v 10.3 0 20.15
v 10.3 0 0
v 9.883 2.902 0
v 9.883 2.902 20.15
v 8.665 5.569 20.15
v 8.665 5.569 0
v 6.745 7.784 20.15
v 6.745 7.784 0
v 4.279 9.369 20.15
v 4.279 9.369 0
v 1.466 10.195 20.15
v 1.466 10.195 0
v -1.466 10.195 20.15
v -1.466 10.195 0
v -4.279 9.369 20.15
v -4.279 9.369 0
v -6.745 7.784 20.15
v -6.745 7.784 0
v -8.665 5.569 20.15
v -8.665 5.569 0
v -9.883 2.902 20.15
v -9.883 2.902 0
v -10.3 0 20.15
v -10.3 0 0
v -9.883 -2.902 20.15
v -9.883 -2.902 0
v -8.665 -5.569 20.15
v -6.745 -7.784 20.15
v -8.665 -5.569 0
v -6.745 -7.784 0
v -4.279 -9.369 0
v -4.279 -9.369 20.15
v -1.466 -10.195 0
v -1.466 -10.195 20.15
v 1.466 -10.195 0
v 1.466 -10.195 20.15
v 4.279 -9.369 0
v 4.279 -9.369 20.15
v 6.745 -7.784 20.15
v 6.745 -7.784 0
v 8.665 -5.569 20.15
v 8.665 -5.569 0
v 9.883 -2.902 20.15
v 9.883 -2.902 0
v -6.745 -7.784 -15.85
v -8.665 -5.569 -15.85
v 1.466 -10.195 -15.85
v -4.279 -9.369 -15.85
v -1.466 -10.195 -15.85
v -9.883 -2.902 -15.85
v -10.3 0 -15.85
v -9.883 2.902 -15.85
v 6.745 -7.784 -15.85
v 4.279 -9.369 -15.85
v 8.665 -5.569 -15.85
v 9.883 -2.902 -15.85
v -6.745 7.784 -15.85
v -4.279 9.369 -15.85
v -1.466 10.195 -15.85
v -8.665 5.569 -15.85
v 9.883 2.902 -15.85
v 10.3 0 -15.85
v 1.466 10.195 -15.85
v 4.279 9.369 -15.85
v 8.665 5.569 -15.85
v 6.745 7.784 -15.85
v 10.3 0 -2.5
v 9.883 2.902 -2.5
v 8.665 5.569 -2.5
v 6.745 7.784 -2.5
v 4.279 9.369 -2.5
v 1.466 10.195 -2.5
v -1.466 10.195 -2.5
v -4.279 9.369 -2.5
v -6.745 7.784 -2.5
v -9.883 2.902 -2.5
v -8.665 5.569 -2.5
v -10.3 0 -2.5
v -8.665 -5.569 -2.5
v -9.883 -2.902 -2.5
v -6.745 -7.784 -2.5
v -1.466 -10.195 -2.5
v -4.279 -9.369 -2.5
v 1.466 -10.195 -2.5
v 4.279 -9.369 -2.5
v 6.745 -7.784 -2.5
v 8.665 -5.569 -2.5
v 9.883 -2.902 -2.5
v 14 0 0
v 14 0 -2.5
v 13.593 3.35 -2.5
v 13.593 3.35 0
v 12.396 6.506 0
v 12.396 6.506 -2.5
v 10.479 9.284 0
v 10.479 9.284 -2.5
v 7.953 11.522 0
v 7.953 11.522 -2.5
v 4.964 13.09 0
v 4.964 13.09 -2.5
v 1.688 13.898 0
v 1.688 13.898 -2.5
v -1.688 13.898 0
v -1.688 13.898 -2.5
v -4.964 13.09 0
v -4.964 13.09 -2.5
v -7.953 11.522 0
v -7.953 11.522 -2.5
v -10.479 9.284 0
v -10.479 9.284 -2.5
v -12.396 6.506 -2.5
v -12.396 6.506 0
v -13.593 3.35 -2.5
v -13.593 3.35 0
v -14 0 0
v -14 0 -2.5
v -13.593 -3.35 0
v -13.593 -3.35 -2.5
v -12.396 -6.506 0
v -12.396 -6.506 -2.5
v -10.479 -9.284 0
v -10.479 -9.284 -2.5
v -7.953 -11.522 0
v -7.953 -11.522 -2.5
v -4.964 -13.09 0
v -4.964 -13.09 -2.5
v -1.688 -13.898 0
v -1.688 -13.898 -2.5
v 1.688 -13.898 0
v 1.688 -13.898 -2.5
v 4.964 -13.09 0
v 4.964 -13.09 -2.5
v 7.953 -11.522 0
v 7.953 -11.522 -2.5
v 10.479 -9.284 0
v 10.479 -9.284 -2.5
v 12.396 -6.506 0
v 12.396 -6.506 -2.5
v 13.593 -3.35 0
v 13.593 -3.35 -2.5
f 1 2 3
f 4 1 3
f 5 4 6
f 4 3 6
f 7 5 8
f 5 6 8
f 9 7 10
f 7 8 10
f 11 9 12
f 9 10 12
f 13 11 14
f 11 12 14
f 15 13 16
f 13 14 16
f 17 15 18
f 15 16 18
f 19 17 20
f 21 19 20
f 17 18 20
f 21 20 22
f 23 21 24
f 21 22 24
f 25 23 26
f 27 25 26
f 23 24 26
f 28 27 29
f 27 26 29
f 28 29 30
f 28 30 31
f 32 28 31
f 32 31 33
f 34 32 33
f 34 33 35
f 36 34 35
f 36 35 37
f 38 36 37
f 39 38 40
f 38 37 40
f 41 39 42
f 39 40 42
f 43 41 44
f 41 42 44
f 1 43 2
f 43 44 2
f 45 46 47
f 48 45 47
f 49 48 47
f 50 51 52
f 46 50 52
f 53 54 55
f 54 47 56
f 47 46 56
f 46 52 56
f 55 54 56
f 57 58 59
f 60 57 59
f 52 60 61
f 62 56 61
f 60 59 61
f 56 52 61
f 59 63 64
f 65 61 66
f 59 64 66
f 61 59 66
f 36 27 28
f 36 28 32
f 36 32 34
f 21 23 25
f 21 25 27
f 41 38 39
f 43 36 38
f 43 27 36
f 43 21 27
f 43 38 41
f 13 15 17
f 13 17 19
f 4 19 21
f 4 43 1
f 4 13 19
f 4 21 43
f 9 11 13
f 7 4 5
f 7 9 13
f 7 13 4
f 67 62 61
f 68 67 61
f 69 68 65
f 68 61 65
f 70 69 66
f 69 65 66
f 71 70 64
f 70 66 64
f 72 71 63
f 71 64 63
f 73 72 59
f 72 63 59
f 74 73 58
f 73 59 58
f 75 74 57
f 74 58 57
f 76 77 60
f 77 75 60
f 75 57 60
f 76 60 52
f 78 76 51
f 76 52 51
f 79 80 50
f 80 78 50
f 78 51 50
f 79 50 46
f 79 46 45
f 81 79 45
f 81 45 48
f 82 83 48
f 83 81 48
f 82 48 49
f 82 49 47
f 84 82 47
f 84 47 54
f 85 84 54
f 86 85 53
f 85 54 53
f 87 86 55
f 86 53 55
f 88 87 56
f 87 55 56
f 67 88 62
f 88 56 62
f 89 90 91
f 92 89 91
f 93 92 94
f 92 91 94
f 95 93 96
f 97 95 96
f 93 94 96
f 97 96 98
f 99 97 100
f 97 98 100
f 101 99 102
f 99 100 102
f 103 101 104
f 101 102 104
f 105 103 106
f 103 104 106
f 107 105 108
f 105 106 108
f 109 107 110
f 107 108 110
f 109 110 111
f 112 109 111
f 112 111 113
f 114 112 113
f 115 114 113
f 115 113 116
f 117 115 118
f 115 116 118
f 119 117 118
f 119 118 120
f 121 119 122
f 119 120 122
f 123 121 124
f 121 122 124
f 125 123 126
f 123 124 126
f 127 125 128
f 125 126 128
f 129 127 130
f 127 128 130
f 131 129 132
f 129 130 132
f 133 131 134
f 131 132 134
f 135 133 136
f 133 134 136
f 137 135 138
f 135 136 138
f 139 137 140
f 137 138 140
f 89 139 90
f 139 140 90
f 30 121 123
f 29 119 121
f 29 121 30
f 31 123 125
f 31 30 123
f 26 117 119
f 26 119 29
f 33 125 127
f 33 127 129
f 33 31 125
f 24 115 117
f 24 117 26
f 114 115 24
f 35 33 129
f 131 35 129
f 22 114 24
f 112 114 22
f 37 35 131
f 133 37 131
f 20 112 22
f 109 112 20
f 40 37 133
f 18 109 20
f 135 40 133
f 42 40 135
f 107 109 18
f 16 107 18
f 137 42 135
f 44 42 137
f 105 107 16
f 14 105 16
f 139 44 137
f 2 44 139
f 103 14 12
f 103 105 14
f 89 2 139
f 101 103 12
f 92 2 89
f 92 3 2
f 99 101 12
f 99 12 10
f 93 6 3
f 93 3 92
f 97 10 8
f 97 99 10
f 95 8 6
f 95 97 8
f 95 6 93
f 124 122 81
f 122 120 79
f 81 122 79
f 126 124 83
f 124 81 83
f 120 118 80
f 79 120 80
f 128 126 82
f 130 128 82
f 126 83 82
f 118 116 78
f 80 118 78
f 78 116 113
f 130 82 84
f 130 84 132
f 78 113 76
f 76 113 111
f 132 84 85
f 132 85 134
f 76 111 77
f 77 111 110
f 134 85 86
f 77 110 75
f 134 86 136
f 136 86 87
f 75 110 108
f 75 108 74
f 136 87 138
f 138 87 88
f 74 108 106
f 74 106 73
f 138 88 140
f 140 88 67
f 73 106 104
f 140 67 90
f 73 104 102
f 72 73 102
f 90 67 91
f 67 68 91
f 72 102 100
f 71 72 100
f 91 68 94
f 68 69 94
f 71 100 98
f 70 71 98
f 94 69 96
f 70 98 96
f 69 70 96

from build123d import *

# Parameters (mm, degrees)
SKETCH1_R           = 10.3
BOSS_EXTRUDE1_DEPTH = 20.15
SKETCH1_3_R         = 14
BOSS_EXTRUDE2_DEPTH = 2.5
BOSS_EXTRUDE3_START = -15.85
SKETCH1_4_R         = 10.3
BOSS_EXTRUDE3_DEPTH = 15.85


with BuildPart() as part:
    # Sketch1 → Boss-Extrude1 (new body)
    with BuildSketch(Plane.XY):
        Circle(SKETCH1_R)
    extrude(amount=BOSS_EXTRUDE1_DEPTH)

    # Sketch1<3> → Boss-Extrude2 (add)
    with BuildSketch(Plane.XY):
        Circle(SKETCH1_3_R)
    extrude(amount=-BOSS_EXTRUDE2_DEPTH)

    # Sketch1<4> → Boss-Extrude3 (add)
    with BuildSketch(Plane.XY.offset(BOSS_EXTRUDE3_START)):
        Circle(SKETCH1_4_R)
    extrude(amount=BOSS_EXTRUDE3_DEPTH)


solid = part.part
